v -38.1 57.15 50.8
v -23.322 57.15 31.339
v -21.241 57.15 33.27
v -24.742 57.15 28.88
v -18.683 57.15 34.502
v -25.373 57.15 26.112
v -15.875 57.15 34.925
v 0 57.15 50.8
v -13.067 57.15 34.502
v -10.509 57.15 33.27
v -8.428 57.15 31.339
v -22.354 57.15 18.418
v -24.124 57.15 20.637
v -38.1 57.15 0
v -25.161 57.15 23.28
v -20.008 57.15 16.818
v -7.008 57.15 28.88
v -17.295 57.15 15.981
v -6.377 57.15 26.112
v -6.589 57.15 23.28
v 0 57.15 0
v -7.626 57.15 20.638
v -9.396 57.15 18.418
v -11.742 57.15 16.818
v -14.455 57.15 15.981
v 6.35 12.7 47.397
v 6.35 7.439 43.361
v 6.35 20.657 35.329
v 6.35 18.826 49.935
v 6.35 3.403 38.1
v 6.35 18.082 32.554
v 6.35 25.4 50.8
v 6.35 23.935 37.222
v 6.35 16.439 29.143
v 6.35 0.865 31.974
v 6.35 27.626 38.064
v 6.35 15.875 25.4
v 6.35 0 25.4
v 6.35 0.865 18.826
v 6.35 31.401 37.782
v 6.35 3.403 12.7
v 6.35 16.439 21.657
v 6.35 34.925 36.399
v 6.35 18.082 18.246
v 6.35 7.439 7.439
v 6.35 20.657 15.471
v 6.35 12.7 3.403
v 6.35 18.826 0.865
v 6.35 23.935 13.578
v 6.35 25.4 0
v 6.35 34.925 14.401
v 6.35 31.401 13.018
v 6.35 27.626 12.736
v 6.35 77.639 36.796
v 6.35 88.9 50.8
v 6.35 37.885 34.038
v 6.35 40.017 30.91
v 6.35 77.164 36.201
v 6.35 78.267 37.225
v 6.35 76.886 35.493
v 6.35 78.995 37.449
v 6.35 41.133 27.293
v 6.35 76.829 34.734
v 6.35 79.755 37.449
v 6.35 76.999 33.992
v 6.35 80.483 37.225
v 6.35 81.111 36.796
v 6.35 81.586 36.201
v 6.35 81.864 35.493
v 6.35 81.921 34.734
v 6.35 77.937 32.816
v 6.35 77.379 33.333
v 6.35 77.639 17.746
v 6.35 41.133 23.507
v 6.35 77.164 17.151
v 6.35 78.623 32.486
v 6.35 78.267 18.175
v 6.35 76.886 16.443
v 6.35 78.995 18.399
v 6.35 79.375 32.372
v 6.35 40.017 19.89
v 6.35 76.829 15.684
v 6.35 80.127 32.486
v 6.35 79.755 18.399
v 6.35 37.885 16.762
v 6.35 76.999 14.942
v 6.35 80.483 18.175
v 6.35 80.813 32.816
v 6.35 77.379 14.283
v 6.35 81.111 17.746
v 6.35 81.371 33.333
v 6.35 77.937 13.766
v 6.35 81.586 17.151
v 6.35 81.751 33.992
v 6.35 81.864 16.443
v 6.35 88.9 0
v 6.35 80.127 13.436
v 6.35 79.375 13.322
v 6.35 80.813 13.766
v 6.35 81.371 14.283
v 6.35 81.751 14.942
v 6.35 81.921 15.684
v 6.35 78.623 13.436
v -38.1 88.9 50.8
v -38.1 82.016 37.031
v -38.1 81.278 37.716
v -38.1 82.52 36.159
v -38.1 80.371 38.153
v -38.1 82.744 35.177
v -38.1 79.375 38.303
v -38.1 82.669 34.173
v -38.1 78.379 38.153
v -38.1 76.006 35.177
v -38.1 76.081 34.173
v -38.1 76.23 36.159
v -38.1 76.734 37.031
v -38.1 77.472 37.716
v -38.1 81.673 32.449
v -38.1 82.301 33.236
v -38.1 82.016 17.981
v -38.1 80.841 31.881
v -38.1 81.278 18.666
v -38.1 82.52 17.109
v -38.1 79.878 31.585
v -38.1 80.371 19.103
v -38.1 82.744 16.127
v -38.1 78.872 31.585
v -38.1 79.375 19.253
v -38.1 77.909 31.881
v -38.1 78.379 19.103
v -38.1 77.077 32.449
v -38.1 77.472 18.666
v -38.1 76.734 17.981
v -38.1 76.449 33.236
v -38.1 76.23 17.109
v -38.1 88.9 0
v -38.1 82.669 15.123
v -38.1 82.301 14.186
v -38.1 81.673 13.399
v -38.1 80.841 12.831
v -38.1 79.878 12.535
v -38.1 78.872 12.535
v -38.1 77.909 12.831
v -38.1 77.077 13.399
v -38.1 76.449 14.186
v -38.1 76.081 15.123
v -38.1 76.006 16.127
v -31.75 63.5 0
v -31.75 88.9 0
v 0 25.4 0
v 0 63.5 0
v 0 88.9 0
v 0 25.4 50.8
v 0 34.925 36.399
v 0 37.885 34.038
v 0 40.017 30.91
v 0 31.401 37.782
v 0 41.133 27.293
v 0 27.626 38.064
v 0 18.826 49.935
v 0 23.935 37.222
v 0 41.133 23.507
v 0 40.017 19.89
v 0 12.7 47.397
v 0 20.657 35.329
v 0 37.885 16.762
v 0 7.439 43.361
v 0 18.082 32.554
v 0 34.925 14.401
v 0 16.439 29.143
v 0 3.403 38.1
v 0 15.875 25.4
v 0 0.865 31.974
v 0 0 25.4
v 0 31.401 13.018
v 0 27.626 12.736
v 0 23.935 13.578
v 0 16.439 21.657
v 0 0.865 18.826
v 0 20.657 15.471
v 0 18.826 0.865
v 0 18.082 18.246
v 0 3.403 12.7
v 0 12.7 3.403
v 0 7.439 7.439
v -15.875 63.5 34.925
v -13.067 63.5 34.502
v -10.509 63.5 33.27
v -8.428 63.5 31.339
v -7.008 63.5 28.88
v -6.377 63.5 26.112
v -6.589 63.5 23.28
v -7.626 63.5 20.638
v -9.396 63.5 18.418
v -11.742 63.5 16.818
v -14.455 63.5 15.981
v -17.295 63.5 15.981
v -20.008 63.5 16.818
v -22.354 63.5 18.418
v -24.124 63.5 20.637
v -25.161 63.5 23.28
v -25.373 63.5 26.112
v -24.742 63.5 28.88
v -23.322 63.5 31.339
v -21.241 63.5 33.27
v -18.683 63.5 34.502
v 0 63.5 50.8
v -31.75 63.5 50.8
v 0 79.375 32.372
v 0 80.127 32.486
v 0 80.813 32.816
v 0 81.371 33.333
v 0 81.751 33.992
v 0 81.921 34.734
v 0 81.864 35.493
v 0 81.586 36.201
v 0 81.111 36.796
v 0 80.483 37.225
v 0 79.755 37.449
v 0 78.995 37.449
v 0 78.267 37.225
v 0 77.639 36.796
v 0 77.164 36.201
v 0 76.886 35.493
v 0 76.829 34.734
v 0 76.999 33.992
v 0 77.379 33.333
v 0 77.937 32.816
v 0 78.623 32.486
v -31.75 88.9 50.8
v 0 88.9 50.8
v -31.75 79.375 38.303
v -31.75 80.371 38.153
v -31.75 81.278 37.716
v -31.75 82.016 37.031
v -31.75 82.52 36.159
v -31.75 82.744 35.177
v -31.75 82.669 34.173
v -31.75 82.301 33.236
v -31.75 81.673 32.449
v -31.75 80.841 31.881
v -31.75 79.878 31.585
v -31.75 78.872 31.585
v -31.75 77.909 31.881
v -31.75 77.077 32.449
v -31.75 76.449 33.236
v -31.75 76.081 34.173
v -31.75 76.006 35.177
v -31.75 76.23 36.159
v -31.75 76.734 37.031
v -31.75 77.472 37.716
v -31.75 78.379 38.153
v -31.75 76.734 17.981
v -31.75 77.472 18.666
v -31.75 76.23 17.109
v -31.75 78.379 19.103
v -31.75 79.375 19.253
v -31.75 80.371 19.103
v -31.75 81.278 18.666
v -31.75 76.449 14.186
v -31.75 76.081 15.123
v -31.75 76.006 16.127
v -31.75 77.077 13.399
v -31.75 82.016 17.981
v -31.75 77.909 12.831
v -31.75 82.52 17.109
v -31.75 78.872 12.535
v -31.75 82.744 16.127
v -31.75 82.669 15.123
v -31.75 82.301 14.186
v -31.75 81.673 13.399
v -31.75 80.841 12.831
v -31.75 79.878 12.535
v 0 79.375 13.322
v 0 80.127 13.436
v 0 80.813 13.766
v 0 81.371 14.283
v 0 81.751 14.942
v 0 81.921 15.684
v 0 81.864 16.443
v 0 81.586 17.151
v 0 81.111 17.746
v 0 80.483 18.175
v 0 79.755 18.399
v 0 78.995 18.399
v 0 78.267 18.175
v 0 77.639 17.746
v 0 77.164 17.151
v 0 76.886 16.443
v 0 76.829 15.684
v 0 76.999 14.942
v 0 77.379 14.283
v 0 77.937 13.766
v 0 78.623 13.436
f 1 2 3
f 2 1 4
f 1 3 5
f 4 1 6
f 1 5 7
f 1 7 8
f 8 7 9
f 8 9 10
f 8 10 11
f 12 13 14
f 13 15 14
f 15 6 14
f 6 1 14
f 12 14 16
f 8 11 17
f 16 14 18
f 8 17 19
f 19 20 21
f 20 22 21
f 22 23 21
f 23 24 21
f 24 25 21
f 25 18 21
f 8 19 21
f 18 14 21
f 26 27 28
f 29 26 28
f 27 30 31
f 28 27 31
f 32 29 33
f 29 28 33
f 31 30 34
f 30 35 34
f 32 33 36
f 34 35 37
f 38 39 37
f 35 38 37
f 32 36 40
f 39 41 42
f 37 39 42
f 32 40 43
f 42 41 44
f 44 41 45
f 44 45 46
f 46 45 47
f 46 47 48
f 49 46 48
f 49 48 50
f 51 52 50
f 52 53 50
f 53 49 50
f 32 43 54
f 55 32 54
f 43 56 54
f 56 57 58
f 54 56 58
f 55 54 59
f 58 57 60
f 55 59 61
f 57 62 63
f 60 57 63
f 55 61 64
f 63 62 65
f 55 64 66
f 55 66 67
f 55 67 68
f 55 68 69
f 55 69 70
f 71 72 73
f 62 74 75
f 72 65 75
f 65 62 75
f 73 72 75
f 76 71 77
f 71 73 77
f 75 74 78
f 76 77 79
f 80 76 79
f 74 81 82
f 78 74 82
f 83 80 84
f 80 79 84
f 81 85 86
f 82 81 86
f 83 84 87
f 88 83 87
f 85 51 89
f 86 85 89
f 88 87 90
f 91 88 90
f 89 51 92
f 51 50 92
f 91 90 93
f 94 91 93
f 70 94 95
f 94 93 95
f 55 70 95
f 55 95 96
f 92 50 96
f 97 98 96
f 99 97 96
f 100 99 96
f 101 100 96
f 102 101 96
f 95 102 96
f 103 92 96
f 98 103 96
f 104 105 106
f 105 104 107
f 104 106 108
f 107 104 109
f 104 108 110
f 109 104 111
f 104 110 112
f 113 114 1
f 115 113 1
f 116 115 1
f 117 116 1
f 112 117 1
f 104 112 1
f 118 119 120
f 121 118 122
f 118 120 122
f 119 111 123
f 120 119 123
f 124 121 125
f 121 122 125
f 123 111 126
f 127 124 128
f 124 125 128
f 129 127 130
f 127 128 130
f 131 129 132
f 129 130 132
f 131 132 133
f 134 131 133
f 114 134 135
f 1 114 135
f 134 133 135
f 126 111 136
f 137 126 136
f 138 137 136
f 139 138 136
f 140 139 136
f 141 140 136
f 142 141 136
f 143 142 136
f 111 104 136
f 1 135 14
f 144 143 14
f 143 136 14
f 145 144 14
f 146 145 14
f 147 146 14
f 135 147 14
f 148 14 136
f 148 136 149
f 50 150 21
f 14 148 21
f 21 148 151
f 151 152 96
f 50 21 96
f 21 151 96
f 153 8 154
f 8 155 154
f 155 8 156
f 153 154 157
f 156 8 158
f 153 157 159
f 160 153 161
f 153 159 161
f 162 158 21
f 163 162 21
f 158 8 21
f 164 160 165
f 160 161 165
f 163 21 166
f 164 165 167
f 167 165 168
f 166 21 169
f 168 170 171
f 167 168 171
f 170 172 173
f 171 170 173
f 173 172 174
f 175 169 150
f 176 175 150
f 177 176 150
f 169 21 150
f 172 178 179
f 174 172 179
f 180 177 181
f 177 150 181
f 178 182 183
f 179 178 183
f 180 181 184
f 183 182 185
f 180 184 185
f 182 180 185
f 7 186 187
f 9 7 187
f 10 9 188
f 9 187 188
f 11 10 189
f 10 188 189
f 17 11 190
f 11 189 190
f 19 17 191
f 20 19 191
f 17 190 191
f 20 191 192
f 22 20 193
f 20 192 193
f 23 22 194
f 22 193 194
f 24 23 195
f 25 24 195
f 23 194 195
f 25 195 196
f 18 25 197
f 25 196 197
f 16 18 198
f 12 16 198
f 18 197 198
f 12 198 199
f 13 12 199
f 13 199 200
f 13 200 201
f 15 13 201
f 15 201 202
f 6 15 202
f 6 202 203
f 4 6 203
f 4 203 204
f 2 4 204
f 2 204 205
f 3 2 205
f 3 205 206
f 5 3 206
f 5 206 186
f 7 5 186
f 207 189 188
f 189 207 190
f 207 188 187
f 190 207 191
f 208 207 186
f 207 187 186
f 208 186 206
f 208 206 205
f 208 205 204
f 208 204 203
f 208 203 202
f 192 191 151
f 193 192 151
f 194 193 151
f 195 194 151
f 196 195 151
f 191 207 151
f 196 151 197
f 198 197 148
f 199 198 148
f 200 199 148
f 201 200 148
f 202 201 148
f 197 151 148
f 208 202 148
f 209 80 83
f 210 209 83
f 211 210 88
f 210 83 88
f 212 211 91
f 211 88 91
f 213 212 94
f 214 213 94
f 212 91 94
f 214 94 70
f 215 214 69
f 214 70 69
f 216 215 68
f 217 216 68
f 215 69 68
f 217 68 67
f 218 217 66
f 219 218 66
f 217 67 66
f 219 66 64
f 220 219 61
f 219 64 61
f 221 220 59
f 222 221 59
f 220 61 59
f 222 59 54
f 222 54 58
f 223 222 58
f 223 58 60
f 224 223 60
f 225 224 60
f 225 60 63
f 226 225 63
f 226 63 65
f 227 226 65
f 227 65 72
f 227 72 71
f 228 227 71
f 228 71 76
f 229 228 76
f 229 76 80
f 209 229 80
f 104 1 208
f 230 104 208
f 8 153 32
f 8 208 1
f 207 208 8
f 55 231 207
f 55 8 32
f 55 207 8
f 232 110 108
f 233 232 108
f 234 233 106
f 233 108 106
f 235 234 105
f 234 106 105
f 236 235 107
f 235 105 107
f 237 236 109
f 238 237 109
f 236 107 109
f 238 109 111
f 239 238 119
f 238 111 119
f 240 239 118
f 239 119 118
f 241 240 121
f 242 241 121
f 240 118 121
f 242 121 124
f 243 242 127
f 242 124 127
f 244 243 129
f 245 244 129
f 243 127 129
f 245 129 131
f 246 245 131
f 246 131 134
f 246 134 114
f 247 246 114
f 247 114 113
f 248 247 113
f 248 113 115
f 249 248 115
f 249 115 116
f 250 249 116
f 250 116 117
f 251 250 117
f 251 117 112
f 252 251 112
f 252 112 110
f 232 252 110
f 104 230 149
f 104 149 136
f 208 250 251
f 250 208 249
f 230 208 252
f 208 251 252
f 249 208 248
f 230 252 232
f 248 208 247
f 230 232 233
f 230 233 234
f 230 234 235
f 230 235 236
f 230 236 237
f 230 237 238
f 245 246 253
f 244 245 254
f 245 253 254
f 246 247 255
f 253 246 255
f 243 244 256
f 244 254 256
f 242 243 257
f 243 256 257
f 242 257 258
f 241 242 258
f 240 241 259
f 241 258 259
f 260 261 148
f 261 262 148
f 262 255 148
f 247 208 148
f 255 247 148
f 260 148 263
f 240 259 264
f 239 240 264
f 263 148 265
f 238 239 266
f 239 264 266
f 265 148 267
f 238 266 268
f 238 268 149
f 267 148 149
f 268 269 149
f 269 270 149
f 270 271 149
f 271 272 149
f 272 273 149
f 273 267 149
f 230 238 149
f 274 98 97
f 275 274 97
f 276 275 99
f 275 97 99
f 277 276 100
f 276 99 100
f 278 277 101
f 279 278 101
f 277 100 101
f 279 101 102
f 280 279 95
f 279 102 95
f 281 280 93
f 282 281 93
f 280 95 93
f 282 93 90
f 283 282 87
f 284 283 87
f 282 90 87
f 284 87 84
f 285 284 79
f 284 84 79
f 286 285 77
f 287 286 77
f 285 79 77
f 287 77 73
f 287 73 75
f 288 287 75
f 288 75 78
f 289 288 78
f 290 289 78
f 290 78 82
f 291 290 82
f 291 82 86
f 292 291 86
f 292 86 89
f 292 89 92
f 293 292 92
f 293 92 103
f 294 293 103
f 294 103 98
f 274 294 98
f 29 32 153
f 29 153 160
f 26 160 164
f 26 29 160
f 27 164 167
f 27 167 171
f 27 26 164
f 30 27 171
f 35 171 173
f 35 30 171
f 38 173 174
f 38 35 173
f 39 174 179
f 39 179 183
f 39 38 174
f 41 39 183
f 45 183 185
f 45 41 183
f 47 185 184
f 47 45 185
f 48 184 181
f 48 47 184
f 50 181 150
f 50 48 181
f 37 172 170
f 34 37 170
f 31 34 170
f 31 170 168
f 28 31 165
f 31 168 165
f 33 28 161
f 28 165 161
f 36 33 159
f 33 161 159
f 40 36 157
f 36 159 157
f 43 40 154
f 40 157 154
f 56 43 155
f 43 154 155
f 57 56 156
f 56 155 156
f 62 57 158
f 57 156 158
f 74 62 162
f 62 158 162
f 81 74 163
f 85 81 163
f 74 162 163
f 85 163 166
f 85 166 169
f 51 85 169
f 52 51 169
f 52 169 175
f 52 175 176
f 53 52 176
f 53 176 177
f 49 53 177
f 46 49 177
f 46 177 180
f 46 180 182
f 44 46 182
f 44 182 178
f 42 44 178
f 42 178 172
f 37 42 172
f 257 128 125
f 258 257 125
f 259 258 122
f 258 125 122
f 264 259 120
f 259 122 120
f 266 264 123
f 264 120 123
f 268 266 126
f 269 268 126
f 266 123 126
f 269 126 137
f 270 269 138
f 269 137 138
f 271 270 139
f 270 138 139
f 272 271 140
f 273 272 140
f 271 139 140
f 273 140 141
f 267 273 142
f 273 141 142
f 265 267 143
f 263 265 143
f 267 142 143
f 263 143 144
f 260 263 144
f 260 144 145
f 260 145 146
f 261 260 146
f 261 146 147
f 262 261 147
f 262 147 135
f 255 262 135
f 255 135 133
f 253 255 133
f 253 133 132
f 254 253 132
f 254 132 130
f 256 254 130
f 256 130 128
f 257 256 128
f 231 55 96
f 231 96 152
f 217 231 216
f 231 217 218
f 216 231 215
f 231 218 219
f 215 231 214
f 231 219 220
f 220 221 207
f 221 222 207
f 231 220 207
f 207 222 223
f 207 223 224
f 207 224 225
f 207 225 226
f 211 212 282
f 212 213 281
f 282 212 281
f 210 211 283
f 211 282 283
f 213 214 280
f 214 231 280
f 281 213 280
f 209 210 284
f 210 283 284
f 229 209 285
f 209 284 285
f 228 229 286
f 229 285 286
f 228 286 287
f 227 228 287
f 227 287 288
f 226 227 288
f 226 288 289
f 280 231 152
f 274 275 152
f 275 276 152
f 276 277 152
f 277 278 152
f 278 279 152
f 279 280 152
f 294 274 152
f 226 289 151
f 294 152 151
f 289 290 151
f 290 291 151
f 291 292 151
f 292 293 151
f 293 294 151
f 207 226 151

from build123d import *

# Parameters (mm, degrees)
BOSS_EXTRUDE1_DEPTH         = 50.8
SKETCH2_R                   = 12.7
CUT_EXTRUDE1_DEPTH          = 44.45
F_1_4_20_TAPPED_HOLE1_D     = 5.1054
F_1_4_20_TAPPED_HOLE1_DEPTH = 6.35
SKETCH5_R                   = 3.3782
CUT_EXTRUDE2_DEPTH          = 8.89
SKETCH6_R                   = 9.525
CUT_EXTRUDE3_DEPTH          = 8.89
FILLET1_RADIUS              = 25.4
FILLET1_LENGTH              = 6.35


with BuildPart() as part:
    # Sketch1 → Boss-Extrude1 (new body)
    with BuildSketch(Plane.XY):
        Polygon((0, 0), (6.35, 0), (6.35, 88.9), (0, 88.9), (0, 63.5), (-31.75, 63.5), (-31.75, 88.9), (-38.1, 88.9), (-38.1, 57.15), (0, 57.15), align=None)
    extrude(amount=BOSS_EXTRUDE1_DEPTH)

    # Sketch2 → Cut-Extrude1 (cut)
    with BuildSketch(Plane.ZY):
        with Locations(Location((25.4, 28.575, 0), (0, 0, 270))):
            Circle(SKETCH2_R)
    extrude(amount=-CUT_EXTRUDE1_DEPTH, mode=Mode.SUBTRACT)

    # 1/4-20 Tapped Hole1
    with Locations(Plane.ZY):
        with Locations((15.875, 79.375), (34.925, 79.375)):
            Hole(F_1_4_20_TAPPED_HOLE1_D / 2, depth=F_1_4_20_TAPPED_HOLE1_DEPTH)

    # Sketch5 → Cut-Extrude2 (cut)
    with BuildSketch(Plane.ZY.offset(38.1)):
        with Locations((15.875, 79.375)):
            Circle(SKETCH5_R)
        with Locations((34.925, 79.375)):
            Circle(SKETCH5_R)
    extrude(amount=-CUT_EXTRUDE2_DEPTH, mode=Mode.SUBTRACT)

    # Sketch6 → Cut-Extrude3 (cut)
    with BuildSketch(Plane(origin=(0, 63.5, 0), x_dir=(1, 0, 0), z_dir=(0, 1, 0))):
        with Locations(Location((-15.875, -25.4, 0), (0, 0, 270))):
            Circle(SKETCH6_R)
    extrude(amount=-CUT_EXTRUDE3_DEPTH, mode=Mode.SUBTRACT)

    # Fillet1: full round fillet: the end face becomes a half cylinder, R = half its width
    fillet1_face = Plane((3.175, 0, 25.4), x_dir=(1, 0, 0), z_dir=(0, -1, 0))  # on the end face: x along it, z out of the body
    fillet1_slab = fillet1_face.offset(-FILLET1_RADIUS / 2) * Box(FILLET1_LENGTH, 2 * FILLET1_RADIUS, FILLET1_RADIUS, mode=Mode.PRIVATE)  # the body's end, R deep
    fillet1_round = Plane((3.175, 25.4, 25.4), x_dir=(0, -1, 0), z_dir=(1, 0, 0)) * Cylinder(FILLET1_RADIUS, FILLET1_LENGTH, mode=Mode.PRIVATE)  # its axis R under the face
    add(fillet1_slab - fillet1_round, mode=Mode.SUBTRACT)


solid = part.part
